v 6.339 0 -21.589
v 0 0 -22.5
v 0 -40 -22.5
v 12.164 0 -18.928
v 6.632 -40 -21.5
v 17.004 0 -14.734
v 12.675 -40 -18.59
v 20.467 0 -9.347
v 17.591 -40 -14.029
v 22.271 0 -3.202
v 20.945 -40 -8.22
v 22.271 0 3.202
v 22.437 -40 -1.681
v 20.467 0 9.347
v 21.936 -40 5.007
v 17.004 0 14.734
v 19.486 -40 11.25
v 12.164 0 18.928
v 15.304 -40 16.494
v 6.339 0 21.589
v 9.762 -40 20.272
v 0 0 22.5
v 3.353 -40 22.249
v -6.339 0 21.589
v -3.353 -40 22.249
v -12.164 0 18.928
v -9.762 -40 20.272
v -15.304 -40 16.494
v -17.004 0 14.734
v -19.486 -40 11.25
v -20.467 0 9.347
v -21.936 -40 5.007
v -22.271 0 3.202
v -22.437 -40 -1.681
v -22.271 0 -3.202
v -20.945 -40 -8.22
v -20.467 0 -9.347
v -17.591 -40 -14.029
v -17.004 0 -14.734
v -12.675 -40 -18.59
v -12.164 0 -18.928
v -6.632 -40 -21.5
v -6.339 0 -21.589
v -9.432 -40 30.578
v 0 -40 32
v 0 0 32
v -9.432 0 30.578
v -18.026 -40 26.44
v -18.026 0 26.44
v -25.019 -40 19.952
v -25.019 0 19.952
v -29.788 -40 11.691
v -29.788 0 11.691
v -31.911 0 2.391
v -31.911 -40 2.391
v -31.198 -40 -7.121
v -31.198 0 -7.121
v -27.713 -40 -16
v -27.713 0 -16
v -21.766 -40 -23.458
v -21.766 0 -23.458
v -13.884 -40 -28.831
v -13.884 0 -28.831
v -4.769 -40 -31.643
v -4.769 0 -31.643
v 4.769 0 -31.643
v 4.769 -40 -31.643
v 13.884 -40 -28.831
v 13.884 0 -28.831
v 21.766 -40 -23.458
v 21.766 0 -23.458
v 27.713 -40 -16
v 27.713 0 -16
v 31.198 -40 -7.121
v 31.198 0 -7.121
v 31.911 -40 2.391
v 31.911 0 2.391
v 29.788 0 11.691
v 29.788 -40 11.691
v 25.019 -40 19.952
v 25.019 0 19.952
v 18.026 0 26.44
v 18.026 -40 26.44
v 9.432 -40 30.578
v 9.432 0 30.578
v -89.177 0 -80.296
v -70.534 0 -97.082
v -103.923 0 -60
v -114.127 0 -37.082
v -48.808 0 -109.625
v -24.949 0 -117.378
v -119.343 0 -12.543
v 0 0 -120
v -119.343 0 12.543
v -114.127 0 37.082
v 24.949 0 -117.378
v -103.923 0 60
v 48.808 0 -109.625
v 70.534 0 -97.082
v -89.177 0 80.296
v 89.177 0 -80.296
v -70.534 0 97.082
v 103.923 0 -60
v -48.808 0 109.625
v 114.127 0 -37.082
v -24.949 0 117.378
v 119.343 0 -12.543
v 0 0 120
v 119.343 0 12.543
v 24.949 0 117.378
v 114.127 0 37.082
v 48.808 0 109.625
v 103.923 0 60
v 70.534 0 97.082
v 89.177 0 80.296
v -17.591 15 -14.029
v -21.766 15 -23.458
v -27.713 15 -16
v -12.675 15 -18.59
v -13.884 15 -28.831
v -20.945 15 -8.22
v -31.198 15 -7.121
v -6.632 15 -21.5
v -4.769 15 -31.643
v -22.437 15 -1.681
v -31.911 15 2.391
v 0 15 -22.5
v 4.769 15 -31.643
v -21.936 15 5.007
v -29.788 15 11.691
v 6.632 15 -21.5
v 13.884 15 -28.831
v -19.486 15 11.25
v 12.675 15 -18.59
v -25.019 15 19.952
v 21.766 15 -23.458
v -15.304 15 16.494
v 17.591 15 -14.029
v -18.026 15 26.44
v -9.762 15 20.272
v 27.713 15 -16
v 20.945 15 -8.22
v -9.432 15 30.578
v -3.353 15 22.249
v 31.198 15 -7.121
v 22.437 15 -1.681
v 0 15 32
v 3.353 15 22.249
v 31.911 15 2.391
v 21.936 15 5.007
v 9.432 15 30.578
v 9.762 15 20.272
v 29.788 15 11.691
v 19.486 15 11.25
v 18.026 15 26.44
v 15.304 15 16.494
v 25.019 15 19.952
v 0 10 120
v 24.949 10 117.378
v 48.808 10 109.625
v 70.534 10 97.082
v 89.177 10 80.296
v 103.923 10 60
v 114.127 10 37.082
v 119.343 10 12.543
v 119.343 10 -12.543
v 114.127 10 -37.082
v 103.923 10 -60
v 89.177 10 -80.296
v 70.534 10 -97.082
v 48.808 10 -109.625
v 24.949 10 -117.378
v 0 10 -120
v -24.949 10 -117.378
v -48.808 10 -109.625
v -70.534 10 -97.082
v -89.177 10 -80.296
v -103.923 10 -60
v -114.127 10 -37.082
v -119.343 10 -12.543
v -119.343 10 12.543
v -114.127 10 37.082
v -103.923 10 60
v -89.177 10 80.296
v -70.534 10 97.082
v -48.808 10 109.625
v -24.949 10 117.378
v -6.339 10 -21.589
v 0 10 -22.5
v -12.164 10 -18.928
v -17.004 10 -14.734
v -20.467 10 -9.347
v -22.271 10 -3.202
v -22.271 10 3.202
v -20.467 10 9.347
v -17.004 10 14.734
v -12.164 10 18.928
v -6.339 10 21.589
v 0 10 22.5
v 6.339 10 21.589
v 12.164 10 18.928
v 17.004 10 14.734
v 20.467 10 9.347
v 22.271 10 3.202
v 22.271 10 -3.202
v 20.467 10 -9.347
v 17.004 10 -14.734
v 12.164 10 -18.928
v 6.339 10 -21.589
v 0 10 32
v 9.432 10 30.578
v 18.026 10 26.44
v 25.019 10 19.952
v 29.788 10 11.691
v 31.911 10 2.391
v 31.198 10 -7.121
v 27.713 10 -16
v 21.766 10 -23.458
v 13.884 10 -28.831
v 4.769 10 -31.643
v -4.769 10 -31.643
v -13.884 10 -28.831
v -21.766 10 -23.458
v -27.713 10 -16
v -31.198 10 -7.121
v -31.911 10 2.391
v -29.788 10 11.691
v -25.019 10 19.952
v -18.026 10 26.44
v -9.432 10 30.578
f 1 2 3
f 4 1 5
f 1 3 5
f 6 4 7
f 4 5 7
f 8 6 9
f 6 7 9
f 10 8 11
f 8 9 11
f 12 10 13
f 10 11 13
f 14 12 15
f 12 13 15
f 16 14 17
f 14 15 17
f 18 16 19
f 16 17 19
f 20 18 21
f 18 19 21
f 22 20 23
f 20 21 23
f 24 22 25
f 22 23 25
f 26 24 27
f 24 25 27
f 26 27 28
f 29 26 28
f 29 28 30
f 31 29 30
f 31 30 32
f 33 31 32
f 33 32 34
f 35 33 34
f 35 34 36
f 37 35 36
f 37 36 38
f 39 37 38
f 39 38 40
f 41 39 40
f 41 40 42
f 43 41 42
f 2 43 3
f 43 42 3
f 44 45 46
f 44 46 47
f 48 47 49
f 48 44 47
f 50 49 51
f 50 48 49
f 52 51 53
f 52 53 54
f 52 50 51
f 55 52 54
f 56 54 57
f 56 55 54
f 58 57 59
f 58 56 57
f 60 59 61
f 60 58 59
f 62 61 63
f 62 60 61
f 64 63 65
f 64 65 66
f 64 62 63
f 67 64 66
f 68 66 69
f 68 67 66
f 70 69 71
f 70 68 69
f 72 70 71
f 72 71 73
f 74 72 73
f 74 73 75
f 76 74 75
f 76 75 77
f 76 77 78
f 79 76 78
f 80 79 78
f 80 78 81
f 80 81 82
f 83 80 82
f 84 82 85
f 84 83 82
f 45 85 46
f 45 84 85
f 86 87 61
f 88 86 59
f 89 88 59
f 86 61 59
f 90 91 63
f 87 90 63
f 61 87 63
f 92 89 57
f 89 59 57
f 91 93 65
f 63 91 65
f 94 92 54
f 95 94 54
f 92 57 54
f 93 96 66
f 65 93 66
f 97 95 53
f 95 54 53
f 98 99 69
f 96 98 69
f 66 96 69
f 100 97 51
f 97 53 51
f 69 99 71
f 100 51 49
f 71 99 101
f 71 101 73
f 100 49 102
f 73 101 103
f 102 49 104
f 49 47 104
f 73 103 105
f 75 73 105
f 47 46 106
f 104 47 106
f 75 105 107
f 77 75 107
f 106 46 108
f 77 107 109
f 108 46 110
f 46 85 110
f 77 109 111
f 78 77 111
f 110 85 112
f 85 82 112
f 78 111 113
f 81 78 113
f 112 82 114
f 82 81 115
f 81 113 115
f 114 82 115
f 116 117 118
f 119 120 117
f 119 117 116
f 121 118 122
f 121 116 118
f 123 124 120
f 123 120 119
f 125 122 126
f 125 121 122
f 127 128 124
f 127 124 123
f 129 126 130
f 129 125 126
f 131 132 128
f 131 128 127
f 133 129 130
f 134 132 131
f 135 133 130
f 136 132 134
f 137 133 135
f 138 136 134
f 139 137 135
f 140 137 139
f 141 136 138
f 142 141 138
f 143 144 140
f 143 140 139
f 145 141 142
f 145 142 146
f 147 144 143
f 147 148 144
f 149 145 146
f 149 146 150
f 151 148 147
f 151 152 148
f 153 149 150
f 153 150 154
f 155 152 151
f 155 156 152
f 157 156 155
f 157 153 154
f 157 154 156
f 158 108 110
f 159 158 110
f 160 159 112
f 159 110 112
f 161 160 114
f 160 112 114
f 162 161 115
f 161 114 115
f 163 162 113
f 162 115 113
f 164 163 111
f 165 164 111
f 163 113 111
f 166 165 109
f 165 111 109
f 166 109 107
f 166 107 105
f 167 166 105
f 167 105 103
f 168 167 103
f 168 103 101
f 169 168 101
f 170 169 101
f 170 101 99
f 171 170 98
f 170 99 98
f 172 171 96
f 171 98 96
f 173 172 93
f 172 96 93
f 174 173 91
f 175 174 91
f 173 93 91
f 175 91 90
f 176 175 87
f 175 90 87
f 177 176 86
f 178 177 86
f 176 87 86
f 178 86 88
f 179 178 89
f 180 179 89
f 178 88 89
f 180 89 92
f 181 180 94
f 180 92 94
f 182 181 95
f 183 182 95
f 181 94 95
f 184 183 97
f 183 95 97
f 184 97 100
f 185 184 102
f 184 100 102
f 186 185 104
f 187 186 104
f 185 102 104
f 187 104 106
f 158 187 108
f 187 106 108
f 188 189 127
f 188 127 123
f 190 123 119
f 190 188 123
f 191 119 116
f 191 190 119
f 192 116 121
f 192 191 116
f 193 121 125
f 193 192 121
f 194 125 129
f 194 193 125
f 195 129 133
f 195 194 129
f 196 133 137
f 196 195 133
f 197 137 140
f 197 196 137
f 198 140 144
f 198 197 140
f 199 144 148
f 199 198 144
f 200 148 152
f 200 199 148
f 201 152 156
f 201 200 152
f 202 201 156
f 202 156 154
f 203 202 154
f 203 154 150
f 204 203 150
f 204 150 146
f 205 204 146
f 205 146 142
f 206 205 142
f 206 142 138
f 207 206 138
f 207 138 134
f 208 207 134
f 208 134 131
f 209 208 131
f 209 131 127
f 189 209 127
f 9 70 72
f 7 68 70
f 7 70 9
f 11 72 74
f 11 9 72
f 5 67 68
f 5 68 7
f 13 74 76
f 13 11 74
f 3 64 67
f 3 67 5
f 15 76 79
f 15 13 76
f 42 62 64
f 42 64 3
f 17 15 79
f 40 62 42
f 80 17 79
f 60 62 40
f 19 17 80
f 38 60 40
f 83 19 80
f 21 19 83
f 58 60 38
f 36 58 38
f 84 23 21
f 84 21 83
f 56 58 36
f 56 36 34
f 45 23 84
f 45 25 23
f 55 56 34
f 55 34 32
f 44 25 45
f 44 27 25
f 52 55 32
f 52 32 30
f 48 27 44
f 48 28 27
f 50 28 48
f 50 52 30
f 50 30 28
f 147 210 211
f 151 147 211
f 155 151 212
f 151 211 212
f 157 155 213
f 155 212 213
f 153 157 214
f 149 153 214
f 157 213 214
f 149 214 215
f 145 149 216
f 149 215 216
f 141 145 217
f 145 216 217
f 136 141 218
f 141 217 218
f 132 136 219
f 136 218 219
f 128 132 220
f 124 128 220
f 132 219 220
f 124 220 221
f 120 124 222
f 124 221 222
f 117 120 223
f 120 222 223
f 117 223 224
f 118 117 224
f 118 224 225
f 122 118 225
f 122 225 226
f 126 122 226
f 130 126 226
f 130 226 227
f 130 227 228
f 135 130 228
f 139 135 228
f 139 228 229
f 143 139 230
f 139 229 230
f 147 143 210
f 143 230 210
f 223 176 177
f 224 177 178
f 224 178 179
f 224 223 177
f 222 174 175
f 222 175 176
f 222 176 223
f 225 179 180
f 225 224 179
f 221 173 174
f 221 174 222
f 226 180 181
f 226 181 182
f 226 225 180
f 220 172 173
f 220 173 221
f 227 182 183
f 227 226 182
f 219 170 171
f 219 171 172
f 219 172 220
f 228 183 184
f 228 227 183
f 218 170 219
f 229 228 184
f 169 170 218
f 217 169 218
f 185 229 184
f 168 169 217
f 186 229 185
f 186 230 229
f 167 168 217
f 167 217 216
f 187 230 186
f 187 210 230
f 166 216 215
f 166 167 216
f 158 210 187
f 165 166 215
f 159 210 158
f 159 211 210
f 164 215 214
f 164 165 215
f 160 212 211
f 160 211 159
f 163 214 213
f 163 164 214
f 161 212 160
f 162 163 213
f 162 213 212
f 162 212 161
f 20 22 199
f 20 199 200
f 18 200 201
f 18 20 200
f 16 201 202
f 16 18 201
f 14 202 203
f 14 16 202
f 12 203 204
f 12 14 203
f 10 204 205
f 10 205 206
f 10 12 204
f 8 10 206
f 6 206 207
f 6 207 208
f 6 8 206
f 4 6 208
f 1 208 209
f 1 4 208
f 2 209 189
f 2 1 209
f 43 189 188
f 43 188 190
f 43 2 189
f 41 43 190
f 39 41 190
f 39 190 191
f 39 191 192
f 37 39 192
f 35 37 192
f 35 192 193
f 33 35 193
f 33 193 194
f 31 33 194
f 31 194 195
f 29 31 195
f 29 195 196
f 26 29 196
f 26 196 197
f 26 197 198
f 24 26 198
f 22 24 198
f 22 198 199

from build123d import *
from build123d.topology import SkipClean

# Parameters (mm, degrees)
SKETCH_1_R      = 120
SKETCH_1_R_2    = 22.5
EXTRUDE_1_DEPTH = 10
EXTRUDE_START   = 40
SKETCH_2_R      = 32
SKETCH_2_R_2    = 22.5
EXTRUDE_2_DEPTH = 40
SKETCH_3_R      = 32
SKETCH_3_R_2    = 22.5
EXTRUDE_3_DEPTH = 5


with BuildPart() as part:
    # 草图1 → 凸台-拉伸1 (new body)
    with BuildSketch(Plane(origin=(0, 0, 0), x_dir=(1, 0, 0), z_dir=(0, 1, 0))):
        with Locations(Location((0, 0, 0), (0, 0, 270))):
            Circle(SKETCH_1_R)
        with Locations(Location((0, 0, 0), (0, 0, 270))):
            Circle(SKETCH_1_R_2, mode=Mode.SUBTRACT)
    extrude(amount=EXTRUDE_1_DEPTH)

    # 草图2 → 凸台-拉伸2 (add)
    with SkipClean():  # the faces are left unmerged after this step: merging them gives an invalid solid
        with BuildSketch(Plane.XZ.offset(EXTRUDE_START)):
            with Locations(Location((0, 0, 0), (0, 0, 90))):
                Circle(SKETCH_2_R)
            with Locations(Location((0, 0, 0), (0, 0, 270))):
                Circle(SKETCH_2_R_2, mode=Mode.SUBTRACT)
        extrude(amount=-EXTRUDE_2_DEPTH)

    # 草图3 → 凸台-拉伸3 (add)
    with BuildSketch(Plane(origin=(0, 10, 0), x_dir=(1, 0, 0), z_dir=(0, 1, 0))):
        with Locations(Location((0, 0, 0), (0, 0, 270))):
            Circle(SKETCH_3_R)
        with Locations(Location((0, 0, 0), (0, 0, 90))):
            Circle(SKETCH_3_R_2, mode=Mode.SUBTRACT)
    extrude(amount=EXTRUDE_3_DEPTH)


solid = part.part
